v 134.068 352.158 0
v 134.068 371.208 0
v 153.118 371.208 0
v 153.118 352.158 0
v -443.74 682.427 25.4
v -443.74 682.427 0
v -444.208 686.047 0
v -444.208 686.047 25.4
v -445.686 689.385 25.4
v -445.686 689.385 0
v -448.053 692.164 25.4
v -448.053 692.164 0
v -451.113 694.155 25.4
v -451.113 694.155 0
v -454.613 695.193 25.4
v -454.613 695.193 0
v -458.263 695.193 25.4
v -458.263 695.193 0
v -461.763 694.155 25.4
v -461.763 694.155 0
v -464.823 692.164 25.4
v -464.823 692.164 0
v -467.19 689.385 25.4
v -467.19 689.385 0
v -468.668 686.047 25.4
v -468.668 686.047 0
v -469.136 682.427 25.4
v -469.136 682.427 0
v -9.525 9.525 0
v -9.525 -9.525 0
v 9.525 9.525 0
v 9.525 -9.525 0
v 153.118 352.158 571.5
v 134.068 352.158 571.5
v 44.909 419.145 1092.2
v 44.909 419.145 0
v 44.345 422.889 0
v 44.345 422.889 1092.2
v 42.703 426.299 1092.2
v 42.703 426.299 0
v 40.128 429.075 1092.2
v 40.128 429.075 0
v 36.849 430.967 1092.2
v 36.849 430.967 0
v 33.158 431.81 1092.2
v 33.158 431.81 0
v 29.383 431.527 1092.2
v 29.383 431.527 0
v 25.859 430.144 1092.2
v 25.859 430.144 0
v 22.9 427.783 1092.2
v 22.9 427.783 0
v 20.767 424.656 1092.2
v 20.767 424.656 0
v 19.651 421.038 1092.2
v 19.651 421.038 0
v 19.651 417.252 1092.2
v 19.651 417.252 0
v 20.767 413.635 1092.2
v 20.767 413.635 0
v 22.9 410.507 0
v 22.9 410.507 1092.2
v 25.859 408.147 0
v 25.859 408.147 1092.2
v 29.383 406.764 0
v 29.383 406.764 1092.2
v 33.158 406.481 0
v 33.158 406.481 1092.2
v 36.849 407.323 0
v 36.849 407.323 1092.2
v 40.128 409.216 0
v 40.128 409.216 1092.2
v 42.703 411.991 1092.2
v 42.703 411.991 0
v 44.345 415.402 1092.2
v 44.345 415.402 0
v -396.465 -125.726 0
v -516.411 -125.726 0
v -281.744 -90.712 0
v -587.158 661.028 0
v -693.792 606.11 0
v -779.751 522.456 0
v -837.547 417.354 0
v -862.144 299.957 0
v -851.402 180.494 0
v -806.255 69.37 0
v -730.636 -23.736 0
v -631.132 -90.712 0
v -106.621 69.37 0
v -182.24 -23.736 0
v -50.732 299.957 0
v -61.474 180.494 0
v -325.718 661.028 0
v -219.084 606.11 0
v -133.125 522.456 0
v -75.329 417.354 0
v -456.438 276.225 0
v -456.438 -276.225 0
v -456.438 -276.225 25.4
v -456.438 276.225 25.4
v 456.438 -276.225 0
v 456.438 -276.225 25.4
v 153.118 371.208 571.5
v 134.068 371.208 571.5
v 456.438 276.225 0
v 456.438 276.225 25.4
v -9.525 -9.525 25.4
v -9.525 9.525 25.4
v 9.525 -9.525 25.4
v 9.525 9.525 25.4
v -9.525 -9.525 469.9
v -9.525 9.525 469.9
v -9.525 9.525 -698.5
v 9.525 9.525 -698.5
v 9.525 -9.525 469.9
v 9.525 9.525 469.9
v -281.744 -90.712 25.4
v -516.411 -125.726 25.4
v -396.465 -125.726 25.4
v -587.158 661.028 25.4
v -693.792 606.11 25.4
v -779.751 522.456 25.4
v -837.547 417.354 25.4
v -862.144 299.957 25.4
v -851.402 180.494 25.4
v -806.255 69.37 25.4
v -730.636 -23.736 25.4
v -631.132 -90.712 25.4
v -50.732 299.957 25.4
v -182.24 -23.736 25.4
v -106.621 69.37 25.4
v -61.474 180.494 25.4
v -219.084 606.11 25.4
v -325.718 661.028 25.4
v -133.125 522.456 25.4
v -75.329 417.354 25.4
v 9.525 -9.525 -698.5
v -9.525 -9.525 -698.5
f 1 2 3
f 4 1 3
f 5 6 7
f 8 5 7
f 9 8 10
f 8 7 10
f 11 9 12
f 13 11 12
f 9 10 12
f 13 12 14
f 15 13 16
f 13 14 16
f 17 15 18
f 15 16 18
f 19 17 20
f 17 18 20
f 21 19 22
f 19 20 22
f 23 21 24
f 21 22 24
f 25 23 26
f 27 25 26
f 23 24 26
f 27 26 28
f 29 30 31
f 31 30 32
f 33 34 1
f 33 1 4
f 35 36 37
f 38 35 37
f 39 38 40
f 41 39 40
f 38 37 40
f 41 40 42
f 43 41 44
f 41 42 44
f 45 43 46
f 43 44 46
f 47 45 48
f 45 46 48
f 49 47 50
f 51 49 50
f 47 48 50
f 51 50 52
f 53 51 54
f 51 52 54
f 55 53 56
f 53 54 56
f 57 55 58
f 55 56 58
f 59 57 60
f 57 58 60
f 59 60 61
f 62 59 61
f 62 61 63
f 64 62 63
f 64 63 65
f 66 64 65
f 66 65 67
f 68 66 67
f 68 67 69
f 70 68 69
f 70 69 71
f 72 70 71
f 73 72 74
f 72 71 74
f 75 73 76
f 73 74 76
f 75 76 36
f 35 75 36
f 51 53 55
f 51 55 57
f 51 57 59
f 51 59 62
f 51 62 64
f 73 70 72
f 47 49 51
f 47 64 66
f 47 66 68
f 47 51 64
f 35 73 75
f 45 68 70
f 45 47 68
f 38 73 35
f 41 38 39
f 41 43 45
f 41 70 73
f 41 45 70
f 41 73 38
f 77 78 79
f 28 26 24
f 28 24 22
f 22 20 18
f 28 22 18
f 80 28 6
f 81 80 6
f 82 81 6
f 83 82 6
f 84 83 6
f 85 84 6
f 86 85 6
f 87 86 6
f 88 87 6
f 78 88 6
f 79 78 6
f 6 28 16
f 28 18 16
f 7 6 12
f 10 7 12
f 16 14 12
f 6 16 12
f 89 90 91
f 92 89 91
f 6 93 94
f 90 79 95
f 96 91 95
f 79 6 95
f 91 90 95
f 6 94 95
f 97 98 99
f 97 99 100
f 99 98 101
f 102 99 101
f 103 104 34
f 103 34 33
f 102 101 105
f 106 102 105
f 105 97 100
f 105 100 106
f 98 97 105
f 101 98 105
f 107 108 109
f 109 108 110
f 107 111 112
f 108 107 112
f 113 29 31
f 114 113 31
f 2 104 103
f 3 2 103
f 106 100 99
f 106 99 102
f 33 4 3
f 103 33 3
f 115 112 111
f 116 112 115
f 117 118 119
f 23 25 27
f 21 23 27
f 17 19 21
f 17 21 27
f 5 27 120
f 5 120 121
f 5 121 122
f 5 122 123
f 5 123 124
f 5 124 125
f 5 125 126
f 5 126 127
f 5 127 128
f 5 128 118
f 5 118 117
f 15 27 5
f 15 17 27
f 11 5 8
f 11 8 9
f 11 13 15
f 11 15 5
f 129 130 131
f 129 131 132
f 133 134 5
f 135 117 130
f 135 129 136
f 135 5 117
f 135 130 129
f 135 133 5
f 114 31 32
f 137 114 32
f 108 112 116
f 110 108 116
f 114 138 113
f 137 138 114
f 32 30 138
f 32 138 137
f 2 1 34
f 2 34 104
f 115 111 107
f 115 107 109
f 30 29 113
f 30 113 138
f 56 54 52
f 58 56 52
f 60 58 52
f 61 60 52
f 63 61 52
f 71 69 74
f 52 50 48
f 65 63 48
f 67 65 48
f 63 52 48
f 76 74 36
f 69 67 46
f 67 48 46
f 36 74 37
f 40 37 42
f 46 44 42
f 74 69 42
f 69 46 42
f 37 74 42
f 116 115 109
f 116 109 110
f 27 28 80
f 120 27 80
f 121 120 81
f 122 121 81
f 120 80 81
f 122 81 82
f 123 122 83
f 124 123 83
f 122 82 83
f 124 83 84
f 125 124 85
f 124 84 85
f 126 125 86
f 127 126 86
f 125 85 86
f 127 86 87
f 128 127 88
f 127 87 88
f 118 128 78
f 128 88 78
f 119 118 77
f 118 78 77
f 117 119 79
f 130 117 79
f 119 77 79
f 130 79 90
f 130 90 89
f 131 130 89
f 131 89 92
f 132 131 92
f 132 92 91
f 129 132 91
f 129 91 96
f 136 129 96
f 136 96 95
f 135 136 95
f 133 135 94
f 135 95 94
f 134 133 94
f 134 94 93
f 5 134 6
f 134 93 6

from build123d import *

# Parameters (mm, degrees)
F0_W      = 912.876
F0_H      = 552.45
F4_DEPTH  = 25.4
F5_DEPTH  = 25.4
F2_R      = 12.7
F6_DEPTH  = 1092.2
F3_W      = 19.05
F3_H      = 19.05
F7_DEPTH  = 571.5
F8_W      = 19.05
F8_H      = 19.05
F9_DEPTH  = 444.5
F10_W     = 19.05
F10_H     = 19.05
F11_DEPTH = 698.5


with BuildPart() as f4:
    # F0 (on Top) → F4 (new body)
    with BuildSketch(Plane.XY):
        Rectangle(F0_W, F0_H)
    extrude(amount=F4_DEPTH)


with BuildPart() as f5:
    # F1 (on face) → F5 (new body)
    with BuildSketch(Plane.XY):
        with BuildLine():
            ThreePointArc((-443.7395503876, 682.4265625), (-456.438, 695.325), (-469.1364496124, 682.4265625))
            ThreePointArc((-469.1364496124, 682.4265625), (-862.7883875967, 269.875), (-456.438, -130.175))
            Line((-456.438, -130.175), (-456.438, 276.225))
            Line((-456.438, 276.225), (-50.038, 276.225))
            ThreePointArc((-50.038, 276.225), (-164.614757332, 559.0679865469), (-443.7395503876, 682.4265625))
        make_face()
        with BuildLine():
            Line((-456.438, 276.225), (-456.438, -130.175))
            ThreePointArc((-456.438, -130.175), (-169.0698041258, -11.1431958742), (-50.038, 276.225))
            Line((-50.038, 276.225), (-456.438, 276.225))
        make_face()
    extrude(amount=F5_DEPTH)


with BuildPart() as f6:
    # F2 (on Top) → F6 (new body)
    with BuildSketch(Plane.XY):
        with Locations((32.2094038129, 419.1452562809)):
            Circle(F2_R)
    extrude(amount=F6_DEPTH)


with BuildPart() as f7:
    # F3 (on Top) → F7 (new body)
    with BuildSketch(Plane.XY):
        with Locations((143.5925364494, 361.6829961538)):
            Rectangle(F3_W, F3_H)
    extrude(amount=F7_DEPTH)


with BuildPart() as f9:
    # F8 (on face) → F9 (new body)
    with BuildSketch(Plane.XY.offset(25.4)):
        Rectangle(F8_W, F8_H)
    extrude(amount=F9_DEPTH)


with BuildPart() as f11:
    # F10 (on face) → F11 (new body)
    with BuildSketch(Plane(origin=(0, 0, 0), x_dir=(1, 0, 0), z_dir=(0, 0, -1))):
        Rectangle(F10_W, F10_H)
    extrude(amount=F11_DEPTH)


solid = Compound([f4.part, f5.part, f6.part, f7.part, f9.part, f11.part])
